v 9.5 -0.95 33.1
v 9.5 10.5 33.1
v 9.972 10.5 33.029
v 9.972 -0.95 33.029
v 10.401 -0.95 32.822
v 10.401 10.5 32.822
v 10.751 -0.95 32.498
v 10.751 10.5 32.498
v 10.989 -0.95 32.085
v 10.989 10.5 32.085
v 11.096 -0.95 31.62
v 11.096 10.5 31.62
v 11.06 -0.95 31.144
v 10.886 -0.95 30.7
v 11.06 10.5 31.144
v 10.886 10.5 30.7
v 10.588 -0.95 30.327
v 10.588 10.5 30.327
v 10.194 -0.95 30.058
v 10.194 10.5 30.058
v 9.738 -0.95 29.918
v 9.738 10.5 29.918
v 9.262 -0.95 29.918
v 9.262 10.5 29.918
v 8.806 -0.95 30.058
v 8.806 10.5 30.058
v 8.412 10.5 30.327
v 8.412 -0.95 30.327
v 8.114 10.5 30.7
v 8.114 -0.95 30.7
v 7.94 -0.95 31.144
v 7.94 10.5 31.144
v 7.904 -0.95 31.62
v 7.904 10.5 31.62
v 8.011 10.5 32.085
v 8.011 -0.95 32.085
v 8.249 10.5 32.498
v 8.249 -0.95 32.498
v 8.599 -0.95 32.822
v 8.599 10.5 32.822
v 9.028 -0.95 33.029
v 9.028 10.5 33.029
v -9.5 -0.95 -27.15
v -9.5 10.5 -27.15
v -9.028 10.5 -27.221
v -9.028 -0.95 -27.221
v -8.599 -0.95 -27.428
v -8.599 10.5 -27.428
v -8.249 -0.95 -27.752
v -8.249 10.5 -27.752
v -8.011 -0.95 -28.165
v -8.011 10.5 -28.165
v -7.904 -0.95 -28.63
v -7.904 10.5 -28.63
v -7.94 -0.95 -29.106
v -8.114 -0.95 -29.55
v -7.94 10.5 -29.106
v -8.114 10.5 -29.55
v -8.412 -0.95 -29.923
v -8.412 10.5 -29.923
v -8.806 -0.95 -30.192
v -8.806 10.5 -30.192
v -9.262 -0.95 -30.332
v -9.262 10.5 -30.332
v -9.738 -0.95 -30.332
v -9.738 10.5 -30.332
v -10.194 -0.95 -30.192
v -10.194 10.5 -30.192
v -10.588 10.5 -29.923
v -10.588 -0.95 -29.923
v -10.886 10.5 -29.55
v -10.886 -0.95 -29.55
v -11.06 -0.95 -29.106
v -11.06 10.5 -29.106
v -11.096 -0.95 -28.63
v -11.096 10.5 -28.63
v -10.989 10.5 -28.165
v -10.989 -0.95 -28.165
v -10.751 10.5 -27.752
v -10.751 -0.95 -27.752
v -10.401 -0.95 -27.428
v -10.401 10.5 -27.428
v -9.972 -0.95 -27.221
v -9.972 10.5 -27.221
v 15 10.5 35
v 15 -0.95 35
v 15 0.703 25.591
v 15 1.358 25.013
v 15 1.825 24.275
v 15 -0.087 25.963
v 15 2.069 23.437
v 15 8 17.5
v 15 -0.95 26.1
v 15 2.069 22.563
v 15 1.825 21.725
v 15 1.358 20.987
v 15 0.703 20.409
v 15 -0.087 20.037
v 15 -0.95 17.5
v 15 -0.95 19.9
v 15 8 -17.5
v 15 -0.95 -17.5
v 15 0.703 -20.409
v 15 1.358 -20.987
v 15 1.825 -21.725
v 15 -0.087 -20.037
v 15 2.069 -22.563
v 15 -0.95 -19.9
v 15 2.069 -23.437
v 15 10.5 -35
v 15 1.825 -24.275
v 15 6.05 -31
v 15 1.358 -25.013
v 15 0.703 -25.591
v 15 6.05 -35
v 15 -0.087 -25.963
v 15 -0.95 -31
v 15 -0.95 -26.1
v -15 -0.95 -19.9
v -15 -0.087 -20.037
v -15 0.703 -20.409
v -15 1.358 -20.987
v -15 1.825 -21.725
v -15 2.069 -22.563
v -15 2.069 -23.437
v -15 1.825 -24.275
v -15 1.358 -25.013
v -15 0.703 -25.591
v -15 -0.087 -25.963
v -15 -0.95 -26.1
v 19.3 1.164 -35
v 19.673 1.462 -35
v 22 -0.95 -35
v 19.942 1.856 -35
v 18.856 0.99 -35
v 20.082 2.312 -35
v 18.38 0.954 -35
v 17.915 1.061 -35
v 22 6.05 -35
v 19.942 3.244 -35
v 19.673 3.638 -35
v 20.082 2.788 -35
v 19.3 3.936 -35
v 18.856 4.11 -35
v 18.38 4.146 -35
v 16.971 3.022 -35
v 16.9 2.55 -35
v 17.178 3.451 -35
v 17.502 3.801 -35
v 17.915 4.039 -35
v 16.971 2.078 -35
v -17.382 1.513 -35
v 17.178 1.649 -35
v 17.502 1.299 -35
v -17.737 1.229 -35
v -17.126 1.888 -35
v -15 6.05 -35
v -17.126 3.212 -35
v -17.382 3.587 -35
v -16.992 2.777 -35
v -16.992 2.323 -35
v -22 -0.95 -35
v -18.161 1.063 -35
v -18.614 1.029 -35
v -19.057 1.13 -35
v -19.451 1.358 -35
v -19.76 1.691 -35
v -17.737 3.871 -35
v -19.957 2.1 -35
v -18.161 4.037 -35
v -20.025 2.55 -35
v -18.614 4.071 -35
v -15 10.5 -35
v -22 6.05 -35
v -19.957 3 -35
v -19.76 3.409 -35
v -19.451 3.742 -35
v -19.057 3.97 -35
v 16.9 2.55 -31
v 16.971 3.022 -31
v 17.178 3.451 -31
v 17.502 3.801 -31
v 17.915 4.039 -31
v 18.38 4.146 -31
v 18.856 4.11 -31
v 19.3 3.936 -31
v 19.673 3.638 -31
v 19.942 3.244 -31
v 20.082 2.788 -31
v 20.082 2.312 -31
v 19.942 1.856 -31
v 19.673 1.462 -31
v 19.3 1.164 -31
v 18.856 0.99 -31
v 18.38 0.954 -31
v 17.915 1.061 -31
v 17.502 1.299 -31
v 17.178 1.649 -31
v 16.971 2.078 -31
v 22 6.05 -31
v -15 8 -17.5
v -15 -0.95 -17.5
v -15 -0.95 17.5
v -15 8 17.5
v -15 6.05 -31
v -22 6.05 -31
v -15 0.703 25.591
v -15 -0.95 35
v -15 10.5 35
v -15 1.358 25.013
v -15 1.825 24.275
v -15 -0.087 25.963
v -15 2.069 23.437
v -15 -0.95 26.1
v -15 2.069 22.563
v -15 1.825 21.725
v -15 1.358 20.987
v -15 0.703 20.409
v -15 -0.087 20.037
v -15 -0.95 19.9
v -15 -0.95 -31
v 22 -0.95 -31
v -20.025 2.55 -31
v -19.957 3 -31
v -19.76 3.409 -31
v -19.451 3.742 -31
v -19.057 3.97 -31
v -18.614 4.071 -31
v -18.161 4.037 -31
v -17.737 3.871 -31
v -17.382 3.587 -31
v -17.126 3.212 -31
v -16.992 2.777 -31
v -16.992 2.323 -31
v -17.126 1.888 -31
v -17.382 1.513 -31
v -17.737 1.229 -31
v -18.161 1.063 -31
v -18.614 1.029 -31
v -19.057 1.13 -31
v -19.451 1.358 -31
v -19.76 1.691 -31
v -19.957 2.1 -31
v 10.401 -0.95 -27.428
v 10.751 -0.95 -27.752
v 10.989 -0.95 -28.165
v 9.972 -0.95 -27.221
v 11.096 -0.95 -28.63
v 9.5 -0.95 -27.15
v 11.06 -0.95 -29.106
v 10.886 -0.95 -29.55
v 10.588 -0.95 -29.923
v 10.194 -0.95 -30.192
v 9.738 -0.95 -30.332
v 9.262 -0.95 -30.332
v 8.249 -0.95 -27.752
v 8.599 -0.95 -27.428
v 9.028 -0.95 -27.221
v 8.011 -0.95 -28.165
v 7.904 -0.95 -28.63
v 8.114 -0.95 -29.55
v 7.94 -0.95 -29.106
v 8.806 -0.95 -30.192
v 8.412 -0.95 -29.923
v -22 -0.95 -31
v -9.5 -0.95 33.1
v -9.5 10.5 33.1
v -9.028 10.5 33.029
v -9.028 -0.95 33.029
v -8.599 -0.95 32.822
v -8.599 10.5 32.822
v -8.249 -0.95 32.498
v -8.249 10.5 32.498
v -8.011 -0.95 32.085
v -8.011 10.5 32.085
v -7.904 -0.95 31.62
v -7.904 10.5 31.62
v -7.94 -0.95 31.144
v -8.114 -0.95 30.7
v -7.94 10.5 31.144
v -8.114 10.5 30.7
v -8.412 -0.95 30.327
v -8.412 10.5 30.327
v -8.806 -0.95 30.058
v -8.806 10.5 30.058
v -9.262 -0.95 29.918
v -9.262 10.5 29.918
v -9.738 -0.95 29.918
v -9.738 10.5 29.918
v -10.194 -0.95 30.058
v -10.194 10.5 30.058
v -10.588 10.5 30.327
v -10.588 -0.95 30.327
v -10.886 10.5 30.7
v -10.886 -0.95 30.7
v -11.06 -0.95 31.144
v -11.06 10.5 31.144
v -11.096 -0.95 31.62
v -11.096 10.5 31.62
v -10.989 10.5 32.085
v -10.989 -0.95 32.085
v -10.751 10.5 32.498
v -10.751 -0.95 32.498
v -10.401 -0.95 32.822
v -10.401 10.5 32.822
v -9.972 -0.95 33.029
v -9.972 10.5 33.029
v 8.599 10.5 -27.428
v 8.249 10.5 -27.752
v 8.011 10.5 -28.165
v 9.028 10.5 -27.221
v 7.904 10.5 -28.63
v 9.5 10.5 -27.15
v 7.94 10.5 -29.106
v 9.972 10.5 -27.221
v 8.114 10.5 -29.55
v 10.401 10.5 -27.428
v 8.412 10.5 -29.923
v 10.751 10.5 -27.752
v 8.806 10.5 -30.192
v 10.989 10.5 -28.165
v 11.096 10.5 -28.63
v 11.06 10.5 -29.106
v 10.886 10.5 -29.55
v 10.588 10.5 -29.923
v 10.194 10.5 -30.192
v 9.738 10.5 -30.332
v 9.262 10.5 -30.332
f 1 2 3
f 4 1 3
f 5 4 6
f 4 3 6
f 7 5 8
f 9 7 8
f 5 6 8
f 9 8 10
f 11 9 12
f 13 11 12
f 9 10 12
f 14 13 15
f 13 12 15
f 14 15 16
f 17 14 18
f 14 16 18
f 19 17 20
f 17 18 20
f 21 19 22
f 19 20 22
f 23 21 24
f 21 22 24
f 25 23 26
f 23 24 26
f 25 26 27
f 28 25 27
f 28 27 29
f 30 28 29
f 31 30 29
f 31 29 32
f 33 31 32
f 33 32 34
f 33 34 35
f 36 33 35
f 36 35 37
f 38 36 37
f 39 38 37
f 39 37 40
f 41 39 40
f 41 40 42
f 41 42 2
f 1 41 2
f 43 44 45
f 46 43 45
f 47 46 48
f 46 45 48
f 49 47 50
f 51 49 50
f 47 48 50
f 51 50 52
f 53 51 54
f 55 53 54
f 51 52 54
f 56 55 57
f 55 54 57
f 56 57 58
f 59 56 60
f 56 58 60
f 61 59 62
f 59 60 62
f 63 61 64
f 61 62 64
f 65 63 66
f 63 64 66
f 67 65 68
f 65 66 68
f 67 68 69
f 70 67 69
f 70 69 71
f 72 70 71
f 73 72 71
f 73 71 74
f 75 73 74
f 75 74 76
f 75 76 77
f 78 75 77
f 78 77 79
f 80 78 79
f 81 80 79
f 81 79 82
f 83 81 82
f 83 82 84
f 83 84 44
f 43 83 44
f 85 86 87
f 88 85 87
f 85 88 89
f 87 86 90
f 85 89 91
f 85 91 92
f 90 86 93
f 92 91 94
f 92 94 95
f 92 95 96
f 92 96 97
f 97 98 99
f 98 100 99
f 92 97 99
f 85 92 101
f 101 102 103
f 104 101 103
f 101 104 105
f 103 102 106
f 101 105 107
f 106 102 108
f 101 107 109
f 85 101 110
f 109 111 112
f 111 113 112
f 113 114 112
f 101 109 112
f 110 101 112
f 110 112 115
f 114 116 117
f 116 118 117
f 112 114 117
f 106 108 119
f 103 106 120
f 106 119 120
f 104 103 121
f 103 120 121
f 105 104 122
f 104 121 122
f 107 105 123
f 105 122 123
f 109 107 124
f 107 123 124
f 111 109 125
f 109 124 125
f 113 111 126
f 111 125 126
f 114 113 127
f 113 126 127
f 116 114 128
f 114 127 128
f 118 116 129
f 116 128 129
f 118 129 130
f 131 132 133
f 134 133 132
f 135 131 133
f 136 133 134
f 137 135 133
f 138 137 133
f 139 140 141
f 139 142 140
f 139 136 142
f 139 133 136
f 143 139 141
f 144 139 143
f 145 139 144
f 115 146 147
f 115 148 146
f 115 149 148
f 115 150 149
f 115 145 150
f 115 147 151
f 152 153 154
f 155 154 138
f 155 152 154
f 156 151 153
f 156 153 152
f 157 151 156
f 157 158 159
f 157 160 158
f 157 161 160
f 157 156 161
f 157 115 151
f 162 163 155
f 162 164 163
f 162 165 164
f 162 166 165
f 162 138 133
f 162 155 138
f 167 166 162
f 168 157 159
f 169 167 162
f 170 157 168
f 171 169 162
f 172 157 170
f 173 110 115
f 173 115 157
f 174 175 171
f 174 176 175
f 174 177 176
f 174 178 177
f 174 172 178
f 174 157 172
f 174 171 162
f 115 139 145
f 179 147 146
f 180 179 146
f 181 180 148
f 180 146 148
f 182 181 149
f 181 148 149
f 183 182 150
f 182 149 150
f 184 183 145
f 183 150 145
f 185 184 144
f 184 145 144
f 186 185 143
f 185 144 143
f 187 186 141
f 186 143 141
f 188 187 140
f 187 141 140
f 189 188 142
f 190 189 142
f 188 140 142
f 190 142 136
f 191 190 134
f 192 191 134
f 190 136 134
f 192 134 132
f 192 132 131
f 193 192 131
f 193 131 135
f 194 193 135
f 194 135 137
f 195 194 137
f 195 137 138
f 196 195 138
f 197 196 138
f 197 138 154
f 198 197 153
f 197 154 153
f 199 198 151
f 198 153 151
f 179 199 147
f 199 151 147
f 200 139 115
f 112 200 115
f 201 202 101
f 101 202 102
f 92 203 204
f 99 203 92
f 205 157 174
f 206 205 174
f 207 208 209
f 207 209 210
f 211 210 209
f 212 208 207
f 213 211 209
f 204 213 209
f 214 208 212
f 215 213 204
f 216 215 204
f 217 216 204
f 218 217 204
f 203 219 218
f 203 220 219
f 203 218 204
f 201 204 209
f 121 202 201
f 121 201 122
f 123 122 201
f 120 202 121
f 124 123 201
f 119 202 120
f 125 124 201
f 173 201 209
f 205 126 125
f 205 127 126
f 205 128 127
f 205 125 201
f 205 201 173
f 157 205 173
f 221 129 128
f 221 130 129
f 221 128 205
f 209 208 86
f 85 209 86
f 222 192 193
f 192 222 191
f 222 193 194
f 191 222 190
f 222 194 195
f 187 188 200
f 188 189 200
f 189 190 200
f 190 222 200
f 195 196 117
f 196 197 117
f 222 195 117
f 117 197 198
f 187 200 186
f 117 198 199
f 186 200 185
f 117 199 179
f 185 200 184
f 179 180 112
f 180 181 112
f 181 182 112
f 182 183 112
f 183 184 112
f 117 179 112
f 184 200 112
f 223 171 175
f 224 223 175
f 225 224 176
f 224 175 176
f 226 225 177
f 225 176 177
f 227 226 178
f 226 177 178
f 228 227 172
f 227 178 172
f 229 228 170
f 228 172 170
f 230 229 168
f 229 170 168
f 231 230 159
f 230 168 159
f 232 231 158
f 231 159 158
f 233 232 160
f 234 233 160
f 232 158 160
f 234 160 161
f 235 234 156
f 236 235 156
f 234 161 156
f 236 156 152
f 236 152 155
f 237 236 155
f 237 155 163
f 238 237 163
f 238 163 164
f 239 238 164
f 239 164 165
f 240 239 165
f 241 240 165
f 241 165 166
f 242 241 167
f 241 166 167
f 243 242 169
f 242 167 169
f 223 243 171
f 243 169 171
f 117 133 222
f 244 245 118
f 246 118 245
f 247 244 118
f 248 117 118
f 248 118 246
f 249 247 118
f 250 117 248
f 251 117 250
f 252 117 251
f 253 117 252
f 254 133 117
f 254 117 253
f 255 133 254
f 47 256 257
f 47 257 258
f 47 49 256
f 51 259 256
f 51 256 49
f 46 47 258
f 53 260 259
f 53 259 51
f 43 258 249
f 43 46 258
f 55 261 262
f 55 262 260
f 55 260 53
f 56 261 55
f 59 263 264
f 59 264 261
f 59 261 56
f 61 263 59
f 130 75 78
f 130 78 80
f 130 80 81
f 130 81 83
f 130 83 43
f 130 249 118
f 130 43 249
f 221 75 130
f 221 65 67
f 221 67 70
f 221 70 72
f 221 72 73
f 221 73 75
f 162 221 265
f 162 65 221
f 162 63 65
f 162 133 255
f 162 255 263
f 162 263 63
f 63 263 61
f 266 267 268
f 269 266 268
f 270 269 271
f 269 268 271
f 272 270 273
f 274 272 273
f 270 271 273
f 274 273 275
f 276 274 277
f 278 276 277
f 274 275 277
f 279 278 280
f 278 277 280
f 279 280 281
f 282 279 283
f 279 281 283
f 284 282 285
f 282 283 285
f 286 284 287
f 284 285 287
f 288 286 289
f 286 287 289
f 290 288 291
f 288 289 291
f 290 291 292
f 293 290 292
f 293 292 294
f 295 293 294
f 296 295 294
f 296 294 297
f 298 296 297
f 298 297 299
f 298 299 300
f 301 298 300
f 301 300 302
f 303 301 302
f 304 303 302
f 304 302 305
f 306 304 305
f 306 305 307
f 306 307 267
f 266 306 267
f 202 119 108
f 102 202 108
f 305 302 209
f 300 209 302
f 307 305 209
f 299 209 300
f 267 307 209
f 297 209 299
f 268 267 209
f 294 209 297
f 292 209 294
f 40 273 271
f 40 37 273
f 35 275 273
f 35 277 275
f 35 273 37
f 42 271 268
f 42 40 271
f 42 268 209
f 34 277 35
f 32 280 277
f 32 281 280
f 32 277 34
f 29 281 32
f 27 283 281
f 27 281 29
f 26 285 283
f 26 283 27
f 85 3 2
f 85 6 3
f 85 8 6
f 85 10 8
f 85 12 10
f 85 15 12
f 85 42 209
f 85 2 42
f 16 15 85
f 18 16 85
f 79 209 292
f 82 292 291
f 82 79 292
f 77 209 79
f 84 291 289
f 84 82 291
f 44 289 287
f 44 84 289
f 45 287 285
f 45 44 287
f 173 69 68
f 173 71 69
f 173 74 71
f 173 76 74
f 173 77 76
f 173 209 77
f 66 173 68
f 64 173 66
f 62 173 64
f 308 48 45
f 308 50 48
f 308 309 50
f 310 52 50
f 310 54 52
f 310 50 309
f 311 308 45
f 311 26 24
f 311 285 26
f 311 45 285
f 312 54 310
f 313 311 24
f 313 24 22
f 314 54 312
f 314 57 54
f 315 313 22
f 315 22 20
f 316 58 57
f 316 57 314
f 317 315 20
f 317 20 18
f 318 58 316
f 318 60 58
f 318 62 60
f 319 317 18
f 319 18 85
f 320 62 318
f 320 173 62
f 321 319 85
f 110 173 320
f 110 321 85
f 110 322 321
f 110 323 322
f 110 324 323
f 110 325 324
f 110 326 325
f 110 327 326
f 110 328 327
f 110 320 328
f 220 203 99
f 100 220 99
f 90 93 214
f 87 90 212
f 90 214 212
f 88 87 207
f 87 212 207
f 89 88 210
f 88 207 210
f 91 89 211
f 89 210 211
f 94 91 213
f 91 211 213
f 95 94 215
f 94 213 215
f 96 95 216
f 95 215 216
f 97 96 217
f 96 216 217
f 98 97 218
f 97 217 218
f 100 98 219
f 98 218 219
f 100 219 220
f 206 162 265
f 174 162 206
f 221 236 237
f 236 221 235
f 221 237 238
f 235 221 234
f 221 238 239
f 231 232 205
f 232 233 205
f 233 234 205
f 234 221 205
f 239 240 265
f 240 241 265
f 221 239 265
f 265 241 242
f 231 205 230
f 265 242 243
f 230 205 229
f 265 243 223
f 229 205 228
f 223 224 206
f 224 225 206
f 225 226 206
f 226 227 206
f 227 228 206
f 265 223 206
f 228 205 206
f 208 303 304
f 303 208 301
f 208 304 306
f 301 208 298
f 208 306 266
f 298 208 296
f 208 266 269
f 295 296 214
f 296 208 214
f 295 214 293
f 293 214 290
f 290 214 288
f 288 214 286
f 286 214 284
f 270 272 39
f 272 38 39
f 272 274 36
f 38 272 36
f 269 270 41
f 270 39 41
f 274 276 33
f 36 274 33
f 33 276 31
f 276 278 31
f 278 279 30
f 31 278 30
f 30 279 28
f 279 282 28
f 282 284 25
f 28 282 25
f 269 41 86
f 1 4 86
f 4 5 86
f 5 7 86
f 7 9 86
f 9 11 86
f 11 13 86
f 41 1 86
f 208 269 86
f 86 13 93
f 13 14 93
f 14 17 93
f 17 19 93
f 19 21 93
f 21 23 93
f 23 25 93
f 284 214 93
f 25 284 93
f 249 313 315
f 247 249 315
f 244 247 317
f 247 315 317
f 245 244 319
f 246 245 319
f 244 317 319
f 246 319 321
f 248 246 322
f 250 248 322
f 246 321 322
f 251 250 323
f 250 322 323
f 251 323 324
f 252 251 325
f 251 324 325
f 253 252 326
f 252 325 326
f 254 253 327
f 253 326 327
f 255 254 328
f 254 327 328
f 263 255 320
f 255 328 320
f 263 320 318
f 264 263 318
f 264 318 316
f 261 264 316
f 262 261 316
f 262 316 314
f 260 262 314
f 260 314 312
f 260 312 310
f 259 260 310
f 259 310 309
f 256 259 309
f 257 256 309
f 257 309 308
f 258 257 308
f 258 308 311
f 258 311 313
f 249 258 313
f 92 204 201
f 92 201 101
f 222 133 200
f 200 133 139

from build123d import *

# Parameters (mm, degrees)
BOSS_EXTRUDE2_DEPTH      = 10.5
BOSS_EXTRUDE2_DEPTH_BACK = 0.95
SKETCH3_W                = 30
SKETCH3_H                = 70
SKETCH4_W                = 30
SKETCH4_H                = 35
CUT_EXTRUDE2_DEPTH       = 8.95
SKETCH5_R                = 3.1
CUT_EXTRUDE3_DEPTH       = 48.2784306
SKETCH6_R                = 1.6
CUT_EXTRUDE4_DEPTH       = 40.763079609
SKETCH7_W                = 7
SKETCH7_H                = 7
SKETCH7_R                = 1.6
SKETCH7_R_2              = 1.525130212
BOSS_EXTRUDE3_DEPTH      = 4


with BuildPart() as part:
    # Sketch3 → Boss-Extrude2 (new, two sides: drawn at the far end of the back side and taken through both)
    with BuildSketch(Plane(origin=(0, 0, 0), x_dir=(1, 0, 0), z_dir=(0, 1, 0)).offset(-BOSS_EXTRUDE2_DEPTH_BACK)):
        Rectangle(SKETCH3_W, SKETCH3_H)
    extrude(amount=BOSS_EXTRUDE2_DEPTH + BOSS_EXTRUDE2_DEPTH_BACK)

    # Sketch4 → Cut-Extrude2 (cut)
    with BuildSketch(Plane.XZ.offset(0.95)):
        Rectangle(SKETCH4_W, SKETCH4_H)
    extrude(amount=-CUT_EXTRUDE2_DEPTH, mode=Mode.SUBTRACT)

    # Sketch5 → Cut-Extrude3 (cut, through all)
    with BuildSketch(Plane.ZY.offset(15)):
        with Locations((-23, -1)):
            Circle(SKETCH5_R)
        with Locations((23, -1)):
            Circle(SKETCH5_R)
    extrude(amount=-CUT_EXTRUDE3_DEPTH, mode=Mode.SUBTRACT)

    # Sketch6 → Cut-Extrude4 (cut, through all)
    with BuildSketch(Plane(origin=(0, 10.5, 0), x_dir=(1, 0, 0), z_dir=(0, 1, 0))):
        with Locations(Location((-9.5, 28.75, 0), (0, 0, 270))):
            Circle(SKETCH6_R)
        with Locations(Location((9.5, 28.75, 0), (0, 0, 270))):
            Circle(SKETCH6_R)
        with Locations(Location((-9.5, -31.5, 0), (0, 0, 270))):
            Circle(SKETCH6_R)
        with Locations(Location((9.5, -31.5, 0), (0, 0, 270))):
            Circle(SKETCH6_R)
    extrude(amount=-CUT_EXTRUDE4_DEPTH, mode=Mode.SUBTRACT)

    # Sketch7 → Boss-Extrude3 (add)
    # profile 1 of 2: a face of its own
    with BuildSketch(Plane(origin=(0, 0, -35), x_dir=(-1, 0, 0), z_dir=(0, 0, -1))):
        with Locations((-18.5, 2.55)):
            Rectangle(SKETCH7_W, SKETCH7_H)
        with Locations((-18.5, 2.55)):
            Circle(SKETCH7_R, mode=Mode.SUBTRACT)
    # profile 2 of 2: a face of its own
    with BuildSketch(Plane(origin=(0, 0, -35), x_dir=(-1, 0, 0), z_dir=(0, 0, -1))):
        with Locations((18.5, 2.55)):
            Rectangle(SKETCH7_W, SKETCH7_H)
        with Locations((18.5, 2.55)):
            Circle(SKETCH7_R_2, mode=Mode.SUBTRACT)
    extrude(amount=-BOSS_EXTRUDE3_DEPTH)


solid = part.part
